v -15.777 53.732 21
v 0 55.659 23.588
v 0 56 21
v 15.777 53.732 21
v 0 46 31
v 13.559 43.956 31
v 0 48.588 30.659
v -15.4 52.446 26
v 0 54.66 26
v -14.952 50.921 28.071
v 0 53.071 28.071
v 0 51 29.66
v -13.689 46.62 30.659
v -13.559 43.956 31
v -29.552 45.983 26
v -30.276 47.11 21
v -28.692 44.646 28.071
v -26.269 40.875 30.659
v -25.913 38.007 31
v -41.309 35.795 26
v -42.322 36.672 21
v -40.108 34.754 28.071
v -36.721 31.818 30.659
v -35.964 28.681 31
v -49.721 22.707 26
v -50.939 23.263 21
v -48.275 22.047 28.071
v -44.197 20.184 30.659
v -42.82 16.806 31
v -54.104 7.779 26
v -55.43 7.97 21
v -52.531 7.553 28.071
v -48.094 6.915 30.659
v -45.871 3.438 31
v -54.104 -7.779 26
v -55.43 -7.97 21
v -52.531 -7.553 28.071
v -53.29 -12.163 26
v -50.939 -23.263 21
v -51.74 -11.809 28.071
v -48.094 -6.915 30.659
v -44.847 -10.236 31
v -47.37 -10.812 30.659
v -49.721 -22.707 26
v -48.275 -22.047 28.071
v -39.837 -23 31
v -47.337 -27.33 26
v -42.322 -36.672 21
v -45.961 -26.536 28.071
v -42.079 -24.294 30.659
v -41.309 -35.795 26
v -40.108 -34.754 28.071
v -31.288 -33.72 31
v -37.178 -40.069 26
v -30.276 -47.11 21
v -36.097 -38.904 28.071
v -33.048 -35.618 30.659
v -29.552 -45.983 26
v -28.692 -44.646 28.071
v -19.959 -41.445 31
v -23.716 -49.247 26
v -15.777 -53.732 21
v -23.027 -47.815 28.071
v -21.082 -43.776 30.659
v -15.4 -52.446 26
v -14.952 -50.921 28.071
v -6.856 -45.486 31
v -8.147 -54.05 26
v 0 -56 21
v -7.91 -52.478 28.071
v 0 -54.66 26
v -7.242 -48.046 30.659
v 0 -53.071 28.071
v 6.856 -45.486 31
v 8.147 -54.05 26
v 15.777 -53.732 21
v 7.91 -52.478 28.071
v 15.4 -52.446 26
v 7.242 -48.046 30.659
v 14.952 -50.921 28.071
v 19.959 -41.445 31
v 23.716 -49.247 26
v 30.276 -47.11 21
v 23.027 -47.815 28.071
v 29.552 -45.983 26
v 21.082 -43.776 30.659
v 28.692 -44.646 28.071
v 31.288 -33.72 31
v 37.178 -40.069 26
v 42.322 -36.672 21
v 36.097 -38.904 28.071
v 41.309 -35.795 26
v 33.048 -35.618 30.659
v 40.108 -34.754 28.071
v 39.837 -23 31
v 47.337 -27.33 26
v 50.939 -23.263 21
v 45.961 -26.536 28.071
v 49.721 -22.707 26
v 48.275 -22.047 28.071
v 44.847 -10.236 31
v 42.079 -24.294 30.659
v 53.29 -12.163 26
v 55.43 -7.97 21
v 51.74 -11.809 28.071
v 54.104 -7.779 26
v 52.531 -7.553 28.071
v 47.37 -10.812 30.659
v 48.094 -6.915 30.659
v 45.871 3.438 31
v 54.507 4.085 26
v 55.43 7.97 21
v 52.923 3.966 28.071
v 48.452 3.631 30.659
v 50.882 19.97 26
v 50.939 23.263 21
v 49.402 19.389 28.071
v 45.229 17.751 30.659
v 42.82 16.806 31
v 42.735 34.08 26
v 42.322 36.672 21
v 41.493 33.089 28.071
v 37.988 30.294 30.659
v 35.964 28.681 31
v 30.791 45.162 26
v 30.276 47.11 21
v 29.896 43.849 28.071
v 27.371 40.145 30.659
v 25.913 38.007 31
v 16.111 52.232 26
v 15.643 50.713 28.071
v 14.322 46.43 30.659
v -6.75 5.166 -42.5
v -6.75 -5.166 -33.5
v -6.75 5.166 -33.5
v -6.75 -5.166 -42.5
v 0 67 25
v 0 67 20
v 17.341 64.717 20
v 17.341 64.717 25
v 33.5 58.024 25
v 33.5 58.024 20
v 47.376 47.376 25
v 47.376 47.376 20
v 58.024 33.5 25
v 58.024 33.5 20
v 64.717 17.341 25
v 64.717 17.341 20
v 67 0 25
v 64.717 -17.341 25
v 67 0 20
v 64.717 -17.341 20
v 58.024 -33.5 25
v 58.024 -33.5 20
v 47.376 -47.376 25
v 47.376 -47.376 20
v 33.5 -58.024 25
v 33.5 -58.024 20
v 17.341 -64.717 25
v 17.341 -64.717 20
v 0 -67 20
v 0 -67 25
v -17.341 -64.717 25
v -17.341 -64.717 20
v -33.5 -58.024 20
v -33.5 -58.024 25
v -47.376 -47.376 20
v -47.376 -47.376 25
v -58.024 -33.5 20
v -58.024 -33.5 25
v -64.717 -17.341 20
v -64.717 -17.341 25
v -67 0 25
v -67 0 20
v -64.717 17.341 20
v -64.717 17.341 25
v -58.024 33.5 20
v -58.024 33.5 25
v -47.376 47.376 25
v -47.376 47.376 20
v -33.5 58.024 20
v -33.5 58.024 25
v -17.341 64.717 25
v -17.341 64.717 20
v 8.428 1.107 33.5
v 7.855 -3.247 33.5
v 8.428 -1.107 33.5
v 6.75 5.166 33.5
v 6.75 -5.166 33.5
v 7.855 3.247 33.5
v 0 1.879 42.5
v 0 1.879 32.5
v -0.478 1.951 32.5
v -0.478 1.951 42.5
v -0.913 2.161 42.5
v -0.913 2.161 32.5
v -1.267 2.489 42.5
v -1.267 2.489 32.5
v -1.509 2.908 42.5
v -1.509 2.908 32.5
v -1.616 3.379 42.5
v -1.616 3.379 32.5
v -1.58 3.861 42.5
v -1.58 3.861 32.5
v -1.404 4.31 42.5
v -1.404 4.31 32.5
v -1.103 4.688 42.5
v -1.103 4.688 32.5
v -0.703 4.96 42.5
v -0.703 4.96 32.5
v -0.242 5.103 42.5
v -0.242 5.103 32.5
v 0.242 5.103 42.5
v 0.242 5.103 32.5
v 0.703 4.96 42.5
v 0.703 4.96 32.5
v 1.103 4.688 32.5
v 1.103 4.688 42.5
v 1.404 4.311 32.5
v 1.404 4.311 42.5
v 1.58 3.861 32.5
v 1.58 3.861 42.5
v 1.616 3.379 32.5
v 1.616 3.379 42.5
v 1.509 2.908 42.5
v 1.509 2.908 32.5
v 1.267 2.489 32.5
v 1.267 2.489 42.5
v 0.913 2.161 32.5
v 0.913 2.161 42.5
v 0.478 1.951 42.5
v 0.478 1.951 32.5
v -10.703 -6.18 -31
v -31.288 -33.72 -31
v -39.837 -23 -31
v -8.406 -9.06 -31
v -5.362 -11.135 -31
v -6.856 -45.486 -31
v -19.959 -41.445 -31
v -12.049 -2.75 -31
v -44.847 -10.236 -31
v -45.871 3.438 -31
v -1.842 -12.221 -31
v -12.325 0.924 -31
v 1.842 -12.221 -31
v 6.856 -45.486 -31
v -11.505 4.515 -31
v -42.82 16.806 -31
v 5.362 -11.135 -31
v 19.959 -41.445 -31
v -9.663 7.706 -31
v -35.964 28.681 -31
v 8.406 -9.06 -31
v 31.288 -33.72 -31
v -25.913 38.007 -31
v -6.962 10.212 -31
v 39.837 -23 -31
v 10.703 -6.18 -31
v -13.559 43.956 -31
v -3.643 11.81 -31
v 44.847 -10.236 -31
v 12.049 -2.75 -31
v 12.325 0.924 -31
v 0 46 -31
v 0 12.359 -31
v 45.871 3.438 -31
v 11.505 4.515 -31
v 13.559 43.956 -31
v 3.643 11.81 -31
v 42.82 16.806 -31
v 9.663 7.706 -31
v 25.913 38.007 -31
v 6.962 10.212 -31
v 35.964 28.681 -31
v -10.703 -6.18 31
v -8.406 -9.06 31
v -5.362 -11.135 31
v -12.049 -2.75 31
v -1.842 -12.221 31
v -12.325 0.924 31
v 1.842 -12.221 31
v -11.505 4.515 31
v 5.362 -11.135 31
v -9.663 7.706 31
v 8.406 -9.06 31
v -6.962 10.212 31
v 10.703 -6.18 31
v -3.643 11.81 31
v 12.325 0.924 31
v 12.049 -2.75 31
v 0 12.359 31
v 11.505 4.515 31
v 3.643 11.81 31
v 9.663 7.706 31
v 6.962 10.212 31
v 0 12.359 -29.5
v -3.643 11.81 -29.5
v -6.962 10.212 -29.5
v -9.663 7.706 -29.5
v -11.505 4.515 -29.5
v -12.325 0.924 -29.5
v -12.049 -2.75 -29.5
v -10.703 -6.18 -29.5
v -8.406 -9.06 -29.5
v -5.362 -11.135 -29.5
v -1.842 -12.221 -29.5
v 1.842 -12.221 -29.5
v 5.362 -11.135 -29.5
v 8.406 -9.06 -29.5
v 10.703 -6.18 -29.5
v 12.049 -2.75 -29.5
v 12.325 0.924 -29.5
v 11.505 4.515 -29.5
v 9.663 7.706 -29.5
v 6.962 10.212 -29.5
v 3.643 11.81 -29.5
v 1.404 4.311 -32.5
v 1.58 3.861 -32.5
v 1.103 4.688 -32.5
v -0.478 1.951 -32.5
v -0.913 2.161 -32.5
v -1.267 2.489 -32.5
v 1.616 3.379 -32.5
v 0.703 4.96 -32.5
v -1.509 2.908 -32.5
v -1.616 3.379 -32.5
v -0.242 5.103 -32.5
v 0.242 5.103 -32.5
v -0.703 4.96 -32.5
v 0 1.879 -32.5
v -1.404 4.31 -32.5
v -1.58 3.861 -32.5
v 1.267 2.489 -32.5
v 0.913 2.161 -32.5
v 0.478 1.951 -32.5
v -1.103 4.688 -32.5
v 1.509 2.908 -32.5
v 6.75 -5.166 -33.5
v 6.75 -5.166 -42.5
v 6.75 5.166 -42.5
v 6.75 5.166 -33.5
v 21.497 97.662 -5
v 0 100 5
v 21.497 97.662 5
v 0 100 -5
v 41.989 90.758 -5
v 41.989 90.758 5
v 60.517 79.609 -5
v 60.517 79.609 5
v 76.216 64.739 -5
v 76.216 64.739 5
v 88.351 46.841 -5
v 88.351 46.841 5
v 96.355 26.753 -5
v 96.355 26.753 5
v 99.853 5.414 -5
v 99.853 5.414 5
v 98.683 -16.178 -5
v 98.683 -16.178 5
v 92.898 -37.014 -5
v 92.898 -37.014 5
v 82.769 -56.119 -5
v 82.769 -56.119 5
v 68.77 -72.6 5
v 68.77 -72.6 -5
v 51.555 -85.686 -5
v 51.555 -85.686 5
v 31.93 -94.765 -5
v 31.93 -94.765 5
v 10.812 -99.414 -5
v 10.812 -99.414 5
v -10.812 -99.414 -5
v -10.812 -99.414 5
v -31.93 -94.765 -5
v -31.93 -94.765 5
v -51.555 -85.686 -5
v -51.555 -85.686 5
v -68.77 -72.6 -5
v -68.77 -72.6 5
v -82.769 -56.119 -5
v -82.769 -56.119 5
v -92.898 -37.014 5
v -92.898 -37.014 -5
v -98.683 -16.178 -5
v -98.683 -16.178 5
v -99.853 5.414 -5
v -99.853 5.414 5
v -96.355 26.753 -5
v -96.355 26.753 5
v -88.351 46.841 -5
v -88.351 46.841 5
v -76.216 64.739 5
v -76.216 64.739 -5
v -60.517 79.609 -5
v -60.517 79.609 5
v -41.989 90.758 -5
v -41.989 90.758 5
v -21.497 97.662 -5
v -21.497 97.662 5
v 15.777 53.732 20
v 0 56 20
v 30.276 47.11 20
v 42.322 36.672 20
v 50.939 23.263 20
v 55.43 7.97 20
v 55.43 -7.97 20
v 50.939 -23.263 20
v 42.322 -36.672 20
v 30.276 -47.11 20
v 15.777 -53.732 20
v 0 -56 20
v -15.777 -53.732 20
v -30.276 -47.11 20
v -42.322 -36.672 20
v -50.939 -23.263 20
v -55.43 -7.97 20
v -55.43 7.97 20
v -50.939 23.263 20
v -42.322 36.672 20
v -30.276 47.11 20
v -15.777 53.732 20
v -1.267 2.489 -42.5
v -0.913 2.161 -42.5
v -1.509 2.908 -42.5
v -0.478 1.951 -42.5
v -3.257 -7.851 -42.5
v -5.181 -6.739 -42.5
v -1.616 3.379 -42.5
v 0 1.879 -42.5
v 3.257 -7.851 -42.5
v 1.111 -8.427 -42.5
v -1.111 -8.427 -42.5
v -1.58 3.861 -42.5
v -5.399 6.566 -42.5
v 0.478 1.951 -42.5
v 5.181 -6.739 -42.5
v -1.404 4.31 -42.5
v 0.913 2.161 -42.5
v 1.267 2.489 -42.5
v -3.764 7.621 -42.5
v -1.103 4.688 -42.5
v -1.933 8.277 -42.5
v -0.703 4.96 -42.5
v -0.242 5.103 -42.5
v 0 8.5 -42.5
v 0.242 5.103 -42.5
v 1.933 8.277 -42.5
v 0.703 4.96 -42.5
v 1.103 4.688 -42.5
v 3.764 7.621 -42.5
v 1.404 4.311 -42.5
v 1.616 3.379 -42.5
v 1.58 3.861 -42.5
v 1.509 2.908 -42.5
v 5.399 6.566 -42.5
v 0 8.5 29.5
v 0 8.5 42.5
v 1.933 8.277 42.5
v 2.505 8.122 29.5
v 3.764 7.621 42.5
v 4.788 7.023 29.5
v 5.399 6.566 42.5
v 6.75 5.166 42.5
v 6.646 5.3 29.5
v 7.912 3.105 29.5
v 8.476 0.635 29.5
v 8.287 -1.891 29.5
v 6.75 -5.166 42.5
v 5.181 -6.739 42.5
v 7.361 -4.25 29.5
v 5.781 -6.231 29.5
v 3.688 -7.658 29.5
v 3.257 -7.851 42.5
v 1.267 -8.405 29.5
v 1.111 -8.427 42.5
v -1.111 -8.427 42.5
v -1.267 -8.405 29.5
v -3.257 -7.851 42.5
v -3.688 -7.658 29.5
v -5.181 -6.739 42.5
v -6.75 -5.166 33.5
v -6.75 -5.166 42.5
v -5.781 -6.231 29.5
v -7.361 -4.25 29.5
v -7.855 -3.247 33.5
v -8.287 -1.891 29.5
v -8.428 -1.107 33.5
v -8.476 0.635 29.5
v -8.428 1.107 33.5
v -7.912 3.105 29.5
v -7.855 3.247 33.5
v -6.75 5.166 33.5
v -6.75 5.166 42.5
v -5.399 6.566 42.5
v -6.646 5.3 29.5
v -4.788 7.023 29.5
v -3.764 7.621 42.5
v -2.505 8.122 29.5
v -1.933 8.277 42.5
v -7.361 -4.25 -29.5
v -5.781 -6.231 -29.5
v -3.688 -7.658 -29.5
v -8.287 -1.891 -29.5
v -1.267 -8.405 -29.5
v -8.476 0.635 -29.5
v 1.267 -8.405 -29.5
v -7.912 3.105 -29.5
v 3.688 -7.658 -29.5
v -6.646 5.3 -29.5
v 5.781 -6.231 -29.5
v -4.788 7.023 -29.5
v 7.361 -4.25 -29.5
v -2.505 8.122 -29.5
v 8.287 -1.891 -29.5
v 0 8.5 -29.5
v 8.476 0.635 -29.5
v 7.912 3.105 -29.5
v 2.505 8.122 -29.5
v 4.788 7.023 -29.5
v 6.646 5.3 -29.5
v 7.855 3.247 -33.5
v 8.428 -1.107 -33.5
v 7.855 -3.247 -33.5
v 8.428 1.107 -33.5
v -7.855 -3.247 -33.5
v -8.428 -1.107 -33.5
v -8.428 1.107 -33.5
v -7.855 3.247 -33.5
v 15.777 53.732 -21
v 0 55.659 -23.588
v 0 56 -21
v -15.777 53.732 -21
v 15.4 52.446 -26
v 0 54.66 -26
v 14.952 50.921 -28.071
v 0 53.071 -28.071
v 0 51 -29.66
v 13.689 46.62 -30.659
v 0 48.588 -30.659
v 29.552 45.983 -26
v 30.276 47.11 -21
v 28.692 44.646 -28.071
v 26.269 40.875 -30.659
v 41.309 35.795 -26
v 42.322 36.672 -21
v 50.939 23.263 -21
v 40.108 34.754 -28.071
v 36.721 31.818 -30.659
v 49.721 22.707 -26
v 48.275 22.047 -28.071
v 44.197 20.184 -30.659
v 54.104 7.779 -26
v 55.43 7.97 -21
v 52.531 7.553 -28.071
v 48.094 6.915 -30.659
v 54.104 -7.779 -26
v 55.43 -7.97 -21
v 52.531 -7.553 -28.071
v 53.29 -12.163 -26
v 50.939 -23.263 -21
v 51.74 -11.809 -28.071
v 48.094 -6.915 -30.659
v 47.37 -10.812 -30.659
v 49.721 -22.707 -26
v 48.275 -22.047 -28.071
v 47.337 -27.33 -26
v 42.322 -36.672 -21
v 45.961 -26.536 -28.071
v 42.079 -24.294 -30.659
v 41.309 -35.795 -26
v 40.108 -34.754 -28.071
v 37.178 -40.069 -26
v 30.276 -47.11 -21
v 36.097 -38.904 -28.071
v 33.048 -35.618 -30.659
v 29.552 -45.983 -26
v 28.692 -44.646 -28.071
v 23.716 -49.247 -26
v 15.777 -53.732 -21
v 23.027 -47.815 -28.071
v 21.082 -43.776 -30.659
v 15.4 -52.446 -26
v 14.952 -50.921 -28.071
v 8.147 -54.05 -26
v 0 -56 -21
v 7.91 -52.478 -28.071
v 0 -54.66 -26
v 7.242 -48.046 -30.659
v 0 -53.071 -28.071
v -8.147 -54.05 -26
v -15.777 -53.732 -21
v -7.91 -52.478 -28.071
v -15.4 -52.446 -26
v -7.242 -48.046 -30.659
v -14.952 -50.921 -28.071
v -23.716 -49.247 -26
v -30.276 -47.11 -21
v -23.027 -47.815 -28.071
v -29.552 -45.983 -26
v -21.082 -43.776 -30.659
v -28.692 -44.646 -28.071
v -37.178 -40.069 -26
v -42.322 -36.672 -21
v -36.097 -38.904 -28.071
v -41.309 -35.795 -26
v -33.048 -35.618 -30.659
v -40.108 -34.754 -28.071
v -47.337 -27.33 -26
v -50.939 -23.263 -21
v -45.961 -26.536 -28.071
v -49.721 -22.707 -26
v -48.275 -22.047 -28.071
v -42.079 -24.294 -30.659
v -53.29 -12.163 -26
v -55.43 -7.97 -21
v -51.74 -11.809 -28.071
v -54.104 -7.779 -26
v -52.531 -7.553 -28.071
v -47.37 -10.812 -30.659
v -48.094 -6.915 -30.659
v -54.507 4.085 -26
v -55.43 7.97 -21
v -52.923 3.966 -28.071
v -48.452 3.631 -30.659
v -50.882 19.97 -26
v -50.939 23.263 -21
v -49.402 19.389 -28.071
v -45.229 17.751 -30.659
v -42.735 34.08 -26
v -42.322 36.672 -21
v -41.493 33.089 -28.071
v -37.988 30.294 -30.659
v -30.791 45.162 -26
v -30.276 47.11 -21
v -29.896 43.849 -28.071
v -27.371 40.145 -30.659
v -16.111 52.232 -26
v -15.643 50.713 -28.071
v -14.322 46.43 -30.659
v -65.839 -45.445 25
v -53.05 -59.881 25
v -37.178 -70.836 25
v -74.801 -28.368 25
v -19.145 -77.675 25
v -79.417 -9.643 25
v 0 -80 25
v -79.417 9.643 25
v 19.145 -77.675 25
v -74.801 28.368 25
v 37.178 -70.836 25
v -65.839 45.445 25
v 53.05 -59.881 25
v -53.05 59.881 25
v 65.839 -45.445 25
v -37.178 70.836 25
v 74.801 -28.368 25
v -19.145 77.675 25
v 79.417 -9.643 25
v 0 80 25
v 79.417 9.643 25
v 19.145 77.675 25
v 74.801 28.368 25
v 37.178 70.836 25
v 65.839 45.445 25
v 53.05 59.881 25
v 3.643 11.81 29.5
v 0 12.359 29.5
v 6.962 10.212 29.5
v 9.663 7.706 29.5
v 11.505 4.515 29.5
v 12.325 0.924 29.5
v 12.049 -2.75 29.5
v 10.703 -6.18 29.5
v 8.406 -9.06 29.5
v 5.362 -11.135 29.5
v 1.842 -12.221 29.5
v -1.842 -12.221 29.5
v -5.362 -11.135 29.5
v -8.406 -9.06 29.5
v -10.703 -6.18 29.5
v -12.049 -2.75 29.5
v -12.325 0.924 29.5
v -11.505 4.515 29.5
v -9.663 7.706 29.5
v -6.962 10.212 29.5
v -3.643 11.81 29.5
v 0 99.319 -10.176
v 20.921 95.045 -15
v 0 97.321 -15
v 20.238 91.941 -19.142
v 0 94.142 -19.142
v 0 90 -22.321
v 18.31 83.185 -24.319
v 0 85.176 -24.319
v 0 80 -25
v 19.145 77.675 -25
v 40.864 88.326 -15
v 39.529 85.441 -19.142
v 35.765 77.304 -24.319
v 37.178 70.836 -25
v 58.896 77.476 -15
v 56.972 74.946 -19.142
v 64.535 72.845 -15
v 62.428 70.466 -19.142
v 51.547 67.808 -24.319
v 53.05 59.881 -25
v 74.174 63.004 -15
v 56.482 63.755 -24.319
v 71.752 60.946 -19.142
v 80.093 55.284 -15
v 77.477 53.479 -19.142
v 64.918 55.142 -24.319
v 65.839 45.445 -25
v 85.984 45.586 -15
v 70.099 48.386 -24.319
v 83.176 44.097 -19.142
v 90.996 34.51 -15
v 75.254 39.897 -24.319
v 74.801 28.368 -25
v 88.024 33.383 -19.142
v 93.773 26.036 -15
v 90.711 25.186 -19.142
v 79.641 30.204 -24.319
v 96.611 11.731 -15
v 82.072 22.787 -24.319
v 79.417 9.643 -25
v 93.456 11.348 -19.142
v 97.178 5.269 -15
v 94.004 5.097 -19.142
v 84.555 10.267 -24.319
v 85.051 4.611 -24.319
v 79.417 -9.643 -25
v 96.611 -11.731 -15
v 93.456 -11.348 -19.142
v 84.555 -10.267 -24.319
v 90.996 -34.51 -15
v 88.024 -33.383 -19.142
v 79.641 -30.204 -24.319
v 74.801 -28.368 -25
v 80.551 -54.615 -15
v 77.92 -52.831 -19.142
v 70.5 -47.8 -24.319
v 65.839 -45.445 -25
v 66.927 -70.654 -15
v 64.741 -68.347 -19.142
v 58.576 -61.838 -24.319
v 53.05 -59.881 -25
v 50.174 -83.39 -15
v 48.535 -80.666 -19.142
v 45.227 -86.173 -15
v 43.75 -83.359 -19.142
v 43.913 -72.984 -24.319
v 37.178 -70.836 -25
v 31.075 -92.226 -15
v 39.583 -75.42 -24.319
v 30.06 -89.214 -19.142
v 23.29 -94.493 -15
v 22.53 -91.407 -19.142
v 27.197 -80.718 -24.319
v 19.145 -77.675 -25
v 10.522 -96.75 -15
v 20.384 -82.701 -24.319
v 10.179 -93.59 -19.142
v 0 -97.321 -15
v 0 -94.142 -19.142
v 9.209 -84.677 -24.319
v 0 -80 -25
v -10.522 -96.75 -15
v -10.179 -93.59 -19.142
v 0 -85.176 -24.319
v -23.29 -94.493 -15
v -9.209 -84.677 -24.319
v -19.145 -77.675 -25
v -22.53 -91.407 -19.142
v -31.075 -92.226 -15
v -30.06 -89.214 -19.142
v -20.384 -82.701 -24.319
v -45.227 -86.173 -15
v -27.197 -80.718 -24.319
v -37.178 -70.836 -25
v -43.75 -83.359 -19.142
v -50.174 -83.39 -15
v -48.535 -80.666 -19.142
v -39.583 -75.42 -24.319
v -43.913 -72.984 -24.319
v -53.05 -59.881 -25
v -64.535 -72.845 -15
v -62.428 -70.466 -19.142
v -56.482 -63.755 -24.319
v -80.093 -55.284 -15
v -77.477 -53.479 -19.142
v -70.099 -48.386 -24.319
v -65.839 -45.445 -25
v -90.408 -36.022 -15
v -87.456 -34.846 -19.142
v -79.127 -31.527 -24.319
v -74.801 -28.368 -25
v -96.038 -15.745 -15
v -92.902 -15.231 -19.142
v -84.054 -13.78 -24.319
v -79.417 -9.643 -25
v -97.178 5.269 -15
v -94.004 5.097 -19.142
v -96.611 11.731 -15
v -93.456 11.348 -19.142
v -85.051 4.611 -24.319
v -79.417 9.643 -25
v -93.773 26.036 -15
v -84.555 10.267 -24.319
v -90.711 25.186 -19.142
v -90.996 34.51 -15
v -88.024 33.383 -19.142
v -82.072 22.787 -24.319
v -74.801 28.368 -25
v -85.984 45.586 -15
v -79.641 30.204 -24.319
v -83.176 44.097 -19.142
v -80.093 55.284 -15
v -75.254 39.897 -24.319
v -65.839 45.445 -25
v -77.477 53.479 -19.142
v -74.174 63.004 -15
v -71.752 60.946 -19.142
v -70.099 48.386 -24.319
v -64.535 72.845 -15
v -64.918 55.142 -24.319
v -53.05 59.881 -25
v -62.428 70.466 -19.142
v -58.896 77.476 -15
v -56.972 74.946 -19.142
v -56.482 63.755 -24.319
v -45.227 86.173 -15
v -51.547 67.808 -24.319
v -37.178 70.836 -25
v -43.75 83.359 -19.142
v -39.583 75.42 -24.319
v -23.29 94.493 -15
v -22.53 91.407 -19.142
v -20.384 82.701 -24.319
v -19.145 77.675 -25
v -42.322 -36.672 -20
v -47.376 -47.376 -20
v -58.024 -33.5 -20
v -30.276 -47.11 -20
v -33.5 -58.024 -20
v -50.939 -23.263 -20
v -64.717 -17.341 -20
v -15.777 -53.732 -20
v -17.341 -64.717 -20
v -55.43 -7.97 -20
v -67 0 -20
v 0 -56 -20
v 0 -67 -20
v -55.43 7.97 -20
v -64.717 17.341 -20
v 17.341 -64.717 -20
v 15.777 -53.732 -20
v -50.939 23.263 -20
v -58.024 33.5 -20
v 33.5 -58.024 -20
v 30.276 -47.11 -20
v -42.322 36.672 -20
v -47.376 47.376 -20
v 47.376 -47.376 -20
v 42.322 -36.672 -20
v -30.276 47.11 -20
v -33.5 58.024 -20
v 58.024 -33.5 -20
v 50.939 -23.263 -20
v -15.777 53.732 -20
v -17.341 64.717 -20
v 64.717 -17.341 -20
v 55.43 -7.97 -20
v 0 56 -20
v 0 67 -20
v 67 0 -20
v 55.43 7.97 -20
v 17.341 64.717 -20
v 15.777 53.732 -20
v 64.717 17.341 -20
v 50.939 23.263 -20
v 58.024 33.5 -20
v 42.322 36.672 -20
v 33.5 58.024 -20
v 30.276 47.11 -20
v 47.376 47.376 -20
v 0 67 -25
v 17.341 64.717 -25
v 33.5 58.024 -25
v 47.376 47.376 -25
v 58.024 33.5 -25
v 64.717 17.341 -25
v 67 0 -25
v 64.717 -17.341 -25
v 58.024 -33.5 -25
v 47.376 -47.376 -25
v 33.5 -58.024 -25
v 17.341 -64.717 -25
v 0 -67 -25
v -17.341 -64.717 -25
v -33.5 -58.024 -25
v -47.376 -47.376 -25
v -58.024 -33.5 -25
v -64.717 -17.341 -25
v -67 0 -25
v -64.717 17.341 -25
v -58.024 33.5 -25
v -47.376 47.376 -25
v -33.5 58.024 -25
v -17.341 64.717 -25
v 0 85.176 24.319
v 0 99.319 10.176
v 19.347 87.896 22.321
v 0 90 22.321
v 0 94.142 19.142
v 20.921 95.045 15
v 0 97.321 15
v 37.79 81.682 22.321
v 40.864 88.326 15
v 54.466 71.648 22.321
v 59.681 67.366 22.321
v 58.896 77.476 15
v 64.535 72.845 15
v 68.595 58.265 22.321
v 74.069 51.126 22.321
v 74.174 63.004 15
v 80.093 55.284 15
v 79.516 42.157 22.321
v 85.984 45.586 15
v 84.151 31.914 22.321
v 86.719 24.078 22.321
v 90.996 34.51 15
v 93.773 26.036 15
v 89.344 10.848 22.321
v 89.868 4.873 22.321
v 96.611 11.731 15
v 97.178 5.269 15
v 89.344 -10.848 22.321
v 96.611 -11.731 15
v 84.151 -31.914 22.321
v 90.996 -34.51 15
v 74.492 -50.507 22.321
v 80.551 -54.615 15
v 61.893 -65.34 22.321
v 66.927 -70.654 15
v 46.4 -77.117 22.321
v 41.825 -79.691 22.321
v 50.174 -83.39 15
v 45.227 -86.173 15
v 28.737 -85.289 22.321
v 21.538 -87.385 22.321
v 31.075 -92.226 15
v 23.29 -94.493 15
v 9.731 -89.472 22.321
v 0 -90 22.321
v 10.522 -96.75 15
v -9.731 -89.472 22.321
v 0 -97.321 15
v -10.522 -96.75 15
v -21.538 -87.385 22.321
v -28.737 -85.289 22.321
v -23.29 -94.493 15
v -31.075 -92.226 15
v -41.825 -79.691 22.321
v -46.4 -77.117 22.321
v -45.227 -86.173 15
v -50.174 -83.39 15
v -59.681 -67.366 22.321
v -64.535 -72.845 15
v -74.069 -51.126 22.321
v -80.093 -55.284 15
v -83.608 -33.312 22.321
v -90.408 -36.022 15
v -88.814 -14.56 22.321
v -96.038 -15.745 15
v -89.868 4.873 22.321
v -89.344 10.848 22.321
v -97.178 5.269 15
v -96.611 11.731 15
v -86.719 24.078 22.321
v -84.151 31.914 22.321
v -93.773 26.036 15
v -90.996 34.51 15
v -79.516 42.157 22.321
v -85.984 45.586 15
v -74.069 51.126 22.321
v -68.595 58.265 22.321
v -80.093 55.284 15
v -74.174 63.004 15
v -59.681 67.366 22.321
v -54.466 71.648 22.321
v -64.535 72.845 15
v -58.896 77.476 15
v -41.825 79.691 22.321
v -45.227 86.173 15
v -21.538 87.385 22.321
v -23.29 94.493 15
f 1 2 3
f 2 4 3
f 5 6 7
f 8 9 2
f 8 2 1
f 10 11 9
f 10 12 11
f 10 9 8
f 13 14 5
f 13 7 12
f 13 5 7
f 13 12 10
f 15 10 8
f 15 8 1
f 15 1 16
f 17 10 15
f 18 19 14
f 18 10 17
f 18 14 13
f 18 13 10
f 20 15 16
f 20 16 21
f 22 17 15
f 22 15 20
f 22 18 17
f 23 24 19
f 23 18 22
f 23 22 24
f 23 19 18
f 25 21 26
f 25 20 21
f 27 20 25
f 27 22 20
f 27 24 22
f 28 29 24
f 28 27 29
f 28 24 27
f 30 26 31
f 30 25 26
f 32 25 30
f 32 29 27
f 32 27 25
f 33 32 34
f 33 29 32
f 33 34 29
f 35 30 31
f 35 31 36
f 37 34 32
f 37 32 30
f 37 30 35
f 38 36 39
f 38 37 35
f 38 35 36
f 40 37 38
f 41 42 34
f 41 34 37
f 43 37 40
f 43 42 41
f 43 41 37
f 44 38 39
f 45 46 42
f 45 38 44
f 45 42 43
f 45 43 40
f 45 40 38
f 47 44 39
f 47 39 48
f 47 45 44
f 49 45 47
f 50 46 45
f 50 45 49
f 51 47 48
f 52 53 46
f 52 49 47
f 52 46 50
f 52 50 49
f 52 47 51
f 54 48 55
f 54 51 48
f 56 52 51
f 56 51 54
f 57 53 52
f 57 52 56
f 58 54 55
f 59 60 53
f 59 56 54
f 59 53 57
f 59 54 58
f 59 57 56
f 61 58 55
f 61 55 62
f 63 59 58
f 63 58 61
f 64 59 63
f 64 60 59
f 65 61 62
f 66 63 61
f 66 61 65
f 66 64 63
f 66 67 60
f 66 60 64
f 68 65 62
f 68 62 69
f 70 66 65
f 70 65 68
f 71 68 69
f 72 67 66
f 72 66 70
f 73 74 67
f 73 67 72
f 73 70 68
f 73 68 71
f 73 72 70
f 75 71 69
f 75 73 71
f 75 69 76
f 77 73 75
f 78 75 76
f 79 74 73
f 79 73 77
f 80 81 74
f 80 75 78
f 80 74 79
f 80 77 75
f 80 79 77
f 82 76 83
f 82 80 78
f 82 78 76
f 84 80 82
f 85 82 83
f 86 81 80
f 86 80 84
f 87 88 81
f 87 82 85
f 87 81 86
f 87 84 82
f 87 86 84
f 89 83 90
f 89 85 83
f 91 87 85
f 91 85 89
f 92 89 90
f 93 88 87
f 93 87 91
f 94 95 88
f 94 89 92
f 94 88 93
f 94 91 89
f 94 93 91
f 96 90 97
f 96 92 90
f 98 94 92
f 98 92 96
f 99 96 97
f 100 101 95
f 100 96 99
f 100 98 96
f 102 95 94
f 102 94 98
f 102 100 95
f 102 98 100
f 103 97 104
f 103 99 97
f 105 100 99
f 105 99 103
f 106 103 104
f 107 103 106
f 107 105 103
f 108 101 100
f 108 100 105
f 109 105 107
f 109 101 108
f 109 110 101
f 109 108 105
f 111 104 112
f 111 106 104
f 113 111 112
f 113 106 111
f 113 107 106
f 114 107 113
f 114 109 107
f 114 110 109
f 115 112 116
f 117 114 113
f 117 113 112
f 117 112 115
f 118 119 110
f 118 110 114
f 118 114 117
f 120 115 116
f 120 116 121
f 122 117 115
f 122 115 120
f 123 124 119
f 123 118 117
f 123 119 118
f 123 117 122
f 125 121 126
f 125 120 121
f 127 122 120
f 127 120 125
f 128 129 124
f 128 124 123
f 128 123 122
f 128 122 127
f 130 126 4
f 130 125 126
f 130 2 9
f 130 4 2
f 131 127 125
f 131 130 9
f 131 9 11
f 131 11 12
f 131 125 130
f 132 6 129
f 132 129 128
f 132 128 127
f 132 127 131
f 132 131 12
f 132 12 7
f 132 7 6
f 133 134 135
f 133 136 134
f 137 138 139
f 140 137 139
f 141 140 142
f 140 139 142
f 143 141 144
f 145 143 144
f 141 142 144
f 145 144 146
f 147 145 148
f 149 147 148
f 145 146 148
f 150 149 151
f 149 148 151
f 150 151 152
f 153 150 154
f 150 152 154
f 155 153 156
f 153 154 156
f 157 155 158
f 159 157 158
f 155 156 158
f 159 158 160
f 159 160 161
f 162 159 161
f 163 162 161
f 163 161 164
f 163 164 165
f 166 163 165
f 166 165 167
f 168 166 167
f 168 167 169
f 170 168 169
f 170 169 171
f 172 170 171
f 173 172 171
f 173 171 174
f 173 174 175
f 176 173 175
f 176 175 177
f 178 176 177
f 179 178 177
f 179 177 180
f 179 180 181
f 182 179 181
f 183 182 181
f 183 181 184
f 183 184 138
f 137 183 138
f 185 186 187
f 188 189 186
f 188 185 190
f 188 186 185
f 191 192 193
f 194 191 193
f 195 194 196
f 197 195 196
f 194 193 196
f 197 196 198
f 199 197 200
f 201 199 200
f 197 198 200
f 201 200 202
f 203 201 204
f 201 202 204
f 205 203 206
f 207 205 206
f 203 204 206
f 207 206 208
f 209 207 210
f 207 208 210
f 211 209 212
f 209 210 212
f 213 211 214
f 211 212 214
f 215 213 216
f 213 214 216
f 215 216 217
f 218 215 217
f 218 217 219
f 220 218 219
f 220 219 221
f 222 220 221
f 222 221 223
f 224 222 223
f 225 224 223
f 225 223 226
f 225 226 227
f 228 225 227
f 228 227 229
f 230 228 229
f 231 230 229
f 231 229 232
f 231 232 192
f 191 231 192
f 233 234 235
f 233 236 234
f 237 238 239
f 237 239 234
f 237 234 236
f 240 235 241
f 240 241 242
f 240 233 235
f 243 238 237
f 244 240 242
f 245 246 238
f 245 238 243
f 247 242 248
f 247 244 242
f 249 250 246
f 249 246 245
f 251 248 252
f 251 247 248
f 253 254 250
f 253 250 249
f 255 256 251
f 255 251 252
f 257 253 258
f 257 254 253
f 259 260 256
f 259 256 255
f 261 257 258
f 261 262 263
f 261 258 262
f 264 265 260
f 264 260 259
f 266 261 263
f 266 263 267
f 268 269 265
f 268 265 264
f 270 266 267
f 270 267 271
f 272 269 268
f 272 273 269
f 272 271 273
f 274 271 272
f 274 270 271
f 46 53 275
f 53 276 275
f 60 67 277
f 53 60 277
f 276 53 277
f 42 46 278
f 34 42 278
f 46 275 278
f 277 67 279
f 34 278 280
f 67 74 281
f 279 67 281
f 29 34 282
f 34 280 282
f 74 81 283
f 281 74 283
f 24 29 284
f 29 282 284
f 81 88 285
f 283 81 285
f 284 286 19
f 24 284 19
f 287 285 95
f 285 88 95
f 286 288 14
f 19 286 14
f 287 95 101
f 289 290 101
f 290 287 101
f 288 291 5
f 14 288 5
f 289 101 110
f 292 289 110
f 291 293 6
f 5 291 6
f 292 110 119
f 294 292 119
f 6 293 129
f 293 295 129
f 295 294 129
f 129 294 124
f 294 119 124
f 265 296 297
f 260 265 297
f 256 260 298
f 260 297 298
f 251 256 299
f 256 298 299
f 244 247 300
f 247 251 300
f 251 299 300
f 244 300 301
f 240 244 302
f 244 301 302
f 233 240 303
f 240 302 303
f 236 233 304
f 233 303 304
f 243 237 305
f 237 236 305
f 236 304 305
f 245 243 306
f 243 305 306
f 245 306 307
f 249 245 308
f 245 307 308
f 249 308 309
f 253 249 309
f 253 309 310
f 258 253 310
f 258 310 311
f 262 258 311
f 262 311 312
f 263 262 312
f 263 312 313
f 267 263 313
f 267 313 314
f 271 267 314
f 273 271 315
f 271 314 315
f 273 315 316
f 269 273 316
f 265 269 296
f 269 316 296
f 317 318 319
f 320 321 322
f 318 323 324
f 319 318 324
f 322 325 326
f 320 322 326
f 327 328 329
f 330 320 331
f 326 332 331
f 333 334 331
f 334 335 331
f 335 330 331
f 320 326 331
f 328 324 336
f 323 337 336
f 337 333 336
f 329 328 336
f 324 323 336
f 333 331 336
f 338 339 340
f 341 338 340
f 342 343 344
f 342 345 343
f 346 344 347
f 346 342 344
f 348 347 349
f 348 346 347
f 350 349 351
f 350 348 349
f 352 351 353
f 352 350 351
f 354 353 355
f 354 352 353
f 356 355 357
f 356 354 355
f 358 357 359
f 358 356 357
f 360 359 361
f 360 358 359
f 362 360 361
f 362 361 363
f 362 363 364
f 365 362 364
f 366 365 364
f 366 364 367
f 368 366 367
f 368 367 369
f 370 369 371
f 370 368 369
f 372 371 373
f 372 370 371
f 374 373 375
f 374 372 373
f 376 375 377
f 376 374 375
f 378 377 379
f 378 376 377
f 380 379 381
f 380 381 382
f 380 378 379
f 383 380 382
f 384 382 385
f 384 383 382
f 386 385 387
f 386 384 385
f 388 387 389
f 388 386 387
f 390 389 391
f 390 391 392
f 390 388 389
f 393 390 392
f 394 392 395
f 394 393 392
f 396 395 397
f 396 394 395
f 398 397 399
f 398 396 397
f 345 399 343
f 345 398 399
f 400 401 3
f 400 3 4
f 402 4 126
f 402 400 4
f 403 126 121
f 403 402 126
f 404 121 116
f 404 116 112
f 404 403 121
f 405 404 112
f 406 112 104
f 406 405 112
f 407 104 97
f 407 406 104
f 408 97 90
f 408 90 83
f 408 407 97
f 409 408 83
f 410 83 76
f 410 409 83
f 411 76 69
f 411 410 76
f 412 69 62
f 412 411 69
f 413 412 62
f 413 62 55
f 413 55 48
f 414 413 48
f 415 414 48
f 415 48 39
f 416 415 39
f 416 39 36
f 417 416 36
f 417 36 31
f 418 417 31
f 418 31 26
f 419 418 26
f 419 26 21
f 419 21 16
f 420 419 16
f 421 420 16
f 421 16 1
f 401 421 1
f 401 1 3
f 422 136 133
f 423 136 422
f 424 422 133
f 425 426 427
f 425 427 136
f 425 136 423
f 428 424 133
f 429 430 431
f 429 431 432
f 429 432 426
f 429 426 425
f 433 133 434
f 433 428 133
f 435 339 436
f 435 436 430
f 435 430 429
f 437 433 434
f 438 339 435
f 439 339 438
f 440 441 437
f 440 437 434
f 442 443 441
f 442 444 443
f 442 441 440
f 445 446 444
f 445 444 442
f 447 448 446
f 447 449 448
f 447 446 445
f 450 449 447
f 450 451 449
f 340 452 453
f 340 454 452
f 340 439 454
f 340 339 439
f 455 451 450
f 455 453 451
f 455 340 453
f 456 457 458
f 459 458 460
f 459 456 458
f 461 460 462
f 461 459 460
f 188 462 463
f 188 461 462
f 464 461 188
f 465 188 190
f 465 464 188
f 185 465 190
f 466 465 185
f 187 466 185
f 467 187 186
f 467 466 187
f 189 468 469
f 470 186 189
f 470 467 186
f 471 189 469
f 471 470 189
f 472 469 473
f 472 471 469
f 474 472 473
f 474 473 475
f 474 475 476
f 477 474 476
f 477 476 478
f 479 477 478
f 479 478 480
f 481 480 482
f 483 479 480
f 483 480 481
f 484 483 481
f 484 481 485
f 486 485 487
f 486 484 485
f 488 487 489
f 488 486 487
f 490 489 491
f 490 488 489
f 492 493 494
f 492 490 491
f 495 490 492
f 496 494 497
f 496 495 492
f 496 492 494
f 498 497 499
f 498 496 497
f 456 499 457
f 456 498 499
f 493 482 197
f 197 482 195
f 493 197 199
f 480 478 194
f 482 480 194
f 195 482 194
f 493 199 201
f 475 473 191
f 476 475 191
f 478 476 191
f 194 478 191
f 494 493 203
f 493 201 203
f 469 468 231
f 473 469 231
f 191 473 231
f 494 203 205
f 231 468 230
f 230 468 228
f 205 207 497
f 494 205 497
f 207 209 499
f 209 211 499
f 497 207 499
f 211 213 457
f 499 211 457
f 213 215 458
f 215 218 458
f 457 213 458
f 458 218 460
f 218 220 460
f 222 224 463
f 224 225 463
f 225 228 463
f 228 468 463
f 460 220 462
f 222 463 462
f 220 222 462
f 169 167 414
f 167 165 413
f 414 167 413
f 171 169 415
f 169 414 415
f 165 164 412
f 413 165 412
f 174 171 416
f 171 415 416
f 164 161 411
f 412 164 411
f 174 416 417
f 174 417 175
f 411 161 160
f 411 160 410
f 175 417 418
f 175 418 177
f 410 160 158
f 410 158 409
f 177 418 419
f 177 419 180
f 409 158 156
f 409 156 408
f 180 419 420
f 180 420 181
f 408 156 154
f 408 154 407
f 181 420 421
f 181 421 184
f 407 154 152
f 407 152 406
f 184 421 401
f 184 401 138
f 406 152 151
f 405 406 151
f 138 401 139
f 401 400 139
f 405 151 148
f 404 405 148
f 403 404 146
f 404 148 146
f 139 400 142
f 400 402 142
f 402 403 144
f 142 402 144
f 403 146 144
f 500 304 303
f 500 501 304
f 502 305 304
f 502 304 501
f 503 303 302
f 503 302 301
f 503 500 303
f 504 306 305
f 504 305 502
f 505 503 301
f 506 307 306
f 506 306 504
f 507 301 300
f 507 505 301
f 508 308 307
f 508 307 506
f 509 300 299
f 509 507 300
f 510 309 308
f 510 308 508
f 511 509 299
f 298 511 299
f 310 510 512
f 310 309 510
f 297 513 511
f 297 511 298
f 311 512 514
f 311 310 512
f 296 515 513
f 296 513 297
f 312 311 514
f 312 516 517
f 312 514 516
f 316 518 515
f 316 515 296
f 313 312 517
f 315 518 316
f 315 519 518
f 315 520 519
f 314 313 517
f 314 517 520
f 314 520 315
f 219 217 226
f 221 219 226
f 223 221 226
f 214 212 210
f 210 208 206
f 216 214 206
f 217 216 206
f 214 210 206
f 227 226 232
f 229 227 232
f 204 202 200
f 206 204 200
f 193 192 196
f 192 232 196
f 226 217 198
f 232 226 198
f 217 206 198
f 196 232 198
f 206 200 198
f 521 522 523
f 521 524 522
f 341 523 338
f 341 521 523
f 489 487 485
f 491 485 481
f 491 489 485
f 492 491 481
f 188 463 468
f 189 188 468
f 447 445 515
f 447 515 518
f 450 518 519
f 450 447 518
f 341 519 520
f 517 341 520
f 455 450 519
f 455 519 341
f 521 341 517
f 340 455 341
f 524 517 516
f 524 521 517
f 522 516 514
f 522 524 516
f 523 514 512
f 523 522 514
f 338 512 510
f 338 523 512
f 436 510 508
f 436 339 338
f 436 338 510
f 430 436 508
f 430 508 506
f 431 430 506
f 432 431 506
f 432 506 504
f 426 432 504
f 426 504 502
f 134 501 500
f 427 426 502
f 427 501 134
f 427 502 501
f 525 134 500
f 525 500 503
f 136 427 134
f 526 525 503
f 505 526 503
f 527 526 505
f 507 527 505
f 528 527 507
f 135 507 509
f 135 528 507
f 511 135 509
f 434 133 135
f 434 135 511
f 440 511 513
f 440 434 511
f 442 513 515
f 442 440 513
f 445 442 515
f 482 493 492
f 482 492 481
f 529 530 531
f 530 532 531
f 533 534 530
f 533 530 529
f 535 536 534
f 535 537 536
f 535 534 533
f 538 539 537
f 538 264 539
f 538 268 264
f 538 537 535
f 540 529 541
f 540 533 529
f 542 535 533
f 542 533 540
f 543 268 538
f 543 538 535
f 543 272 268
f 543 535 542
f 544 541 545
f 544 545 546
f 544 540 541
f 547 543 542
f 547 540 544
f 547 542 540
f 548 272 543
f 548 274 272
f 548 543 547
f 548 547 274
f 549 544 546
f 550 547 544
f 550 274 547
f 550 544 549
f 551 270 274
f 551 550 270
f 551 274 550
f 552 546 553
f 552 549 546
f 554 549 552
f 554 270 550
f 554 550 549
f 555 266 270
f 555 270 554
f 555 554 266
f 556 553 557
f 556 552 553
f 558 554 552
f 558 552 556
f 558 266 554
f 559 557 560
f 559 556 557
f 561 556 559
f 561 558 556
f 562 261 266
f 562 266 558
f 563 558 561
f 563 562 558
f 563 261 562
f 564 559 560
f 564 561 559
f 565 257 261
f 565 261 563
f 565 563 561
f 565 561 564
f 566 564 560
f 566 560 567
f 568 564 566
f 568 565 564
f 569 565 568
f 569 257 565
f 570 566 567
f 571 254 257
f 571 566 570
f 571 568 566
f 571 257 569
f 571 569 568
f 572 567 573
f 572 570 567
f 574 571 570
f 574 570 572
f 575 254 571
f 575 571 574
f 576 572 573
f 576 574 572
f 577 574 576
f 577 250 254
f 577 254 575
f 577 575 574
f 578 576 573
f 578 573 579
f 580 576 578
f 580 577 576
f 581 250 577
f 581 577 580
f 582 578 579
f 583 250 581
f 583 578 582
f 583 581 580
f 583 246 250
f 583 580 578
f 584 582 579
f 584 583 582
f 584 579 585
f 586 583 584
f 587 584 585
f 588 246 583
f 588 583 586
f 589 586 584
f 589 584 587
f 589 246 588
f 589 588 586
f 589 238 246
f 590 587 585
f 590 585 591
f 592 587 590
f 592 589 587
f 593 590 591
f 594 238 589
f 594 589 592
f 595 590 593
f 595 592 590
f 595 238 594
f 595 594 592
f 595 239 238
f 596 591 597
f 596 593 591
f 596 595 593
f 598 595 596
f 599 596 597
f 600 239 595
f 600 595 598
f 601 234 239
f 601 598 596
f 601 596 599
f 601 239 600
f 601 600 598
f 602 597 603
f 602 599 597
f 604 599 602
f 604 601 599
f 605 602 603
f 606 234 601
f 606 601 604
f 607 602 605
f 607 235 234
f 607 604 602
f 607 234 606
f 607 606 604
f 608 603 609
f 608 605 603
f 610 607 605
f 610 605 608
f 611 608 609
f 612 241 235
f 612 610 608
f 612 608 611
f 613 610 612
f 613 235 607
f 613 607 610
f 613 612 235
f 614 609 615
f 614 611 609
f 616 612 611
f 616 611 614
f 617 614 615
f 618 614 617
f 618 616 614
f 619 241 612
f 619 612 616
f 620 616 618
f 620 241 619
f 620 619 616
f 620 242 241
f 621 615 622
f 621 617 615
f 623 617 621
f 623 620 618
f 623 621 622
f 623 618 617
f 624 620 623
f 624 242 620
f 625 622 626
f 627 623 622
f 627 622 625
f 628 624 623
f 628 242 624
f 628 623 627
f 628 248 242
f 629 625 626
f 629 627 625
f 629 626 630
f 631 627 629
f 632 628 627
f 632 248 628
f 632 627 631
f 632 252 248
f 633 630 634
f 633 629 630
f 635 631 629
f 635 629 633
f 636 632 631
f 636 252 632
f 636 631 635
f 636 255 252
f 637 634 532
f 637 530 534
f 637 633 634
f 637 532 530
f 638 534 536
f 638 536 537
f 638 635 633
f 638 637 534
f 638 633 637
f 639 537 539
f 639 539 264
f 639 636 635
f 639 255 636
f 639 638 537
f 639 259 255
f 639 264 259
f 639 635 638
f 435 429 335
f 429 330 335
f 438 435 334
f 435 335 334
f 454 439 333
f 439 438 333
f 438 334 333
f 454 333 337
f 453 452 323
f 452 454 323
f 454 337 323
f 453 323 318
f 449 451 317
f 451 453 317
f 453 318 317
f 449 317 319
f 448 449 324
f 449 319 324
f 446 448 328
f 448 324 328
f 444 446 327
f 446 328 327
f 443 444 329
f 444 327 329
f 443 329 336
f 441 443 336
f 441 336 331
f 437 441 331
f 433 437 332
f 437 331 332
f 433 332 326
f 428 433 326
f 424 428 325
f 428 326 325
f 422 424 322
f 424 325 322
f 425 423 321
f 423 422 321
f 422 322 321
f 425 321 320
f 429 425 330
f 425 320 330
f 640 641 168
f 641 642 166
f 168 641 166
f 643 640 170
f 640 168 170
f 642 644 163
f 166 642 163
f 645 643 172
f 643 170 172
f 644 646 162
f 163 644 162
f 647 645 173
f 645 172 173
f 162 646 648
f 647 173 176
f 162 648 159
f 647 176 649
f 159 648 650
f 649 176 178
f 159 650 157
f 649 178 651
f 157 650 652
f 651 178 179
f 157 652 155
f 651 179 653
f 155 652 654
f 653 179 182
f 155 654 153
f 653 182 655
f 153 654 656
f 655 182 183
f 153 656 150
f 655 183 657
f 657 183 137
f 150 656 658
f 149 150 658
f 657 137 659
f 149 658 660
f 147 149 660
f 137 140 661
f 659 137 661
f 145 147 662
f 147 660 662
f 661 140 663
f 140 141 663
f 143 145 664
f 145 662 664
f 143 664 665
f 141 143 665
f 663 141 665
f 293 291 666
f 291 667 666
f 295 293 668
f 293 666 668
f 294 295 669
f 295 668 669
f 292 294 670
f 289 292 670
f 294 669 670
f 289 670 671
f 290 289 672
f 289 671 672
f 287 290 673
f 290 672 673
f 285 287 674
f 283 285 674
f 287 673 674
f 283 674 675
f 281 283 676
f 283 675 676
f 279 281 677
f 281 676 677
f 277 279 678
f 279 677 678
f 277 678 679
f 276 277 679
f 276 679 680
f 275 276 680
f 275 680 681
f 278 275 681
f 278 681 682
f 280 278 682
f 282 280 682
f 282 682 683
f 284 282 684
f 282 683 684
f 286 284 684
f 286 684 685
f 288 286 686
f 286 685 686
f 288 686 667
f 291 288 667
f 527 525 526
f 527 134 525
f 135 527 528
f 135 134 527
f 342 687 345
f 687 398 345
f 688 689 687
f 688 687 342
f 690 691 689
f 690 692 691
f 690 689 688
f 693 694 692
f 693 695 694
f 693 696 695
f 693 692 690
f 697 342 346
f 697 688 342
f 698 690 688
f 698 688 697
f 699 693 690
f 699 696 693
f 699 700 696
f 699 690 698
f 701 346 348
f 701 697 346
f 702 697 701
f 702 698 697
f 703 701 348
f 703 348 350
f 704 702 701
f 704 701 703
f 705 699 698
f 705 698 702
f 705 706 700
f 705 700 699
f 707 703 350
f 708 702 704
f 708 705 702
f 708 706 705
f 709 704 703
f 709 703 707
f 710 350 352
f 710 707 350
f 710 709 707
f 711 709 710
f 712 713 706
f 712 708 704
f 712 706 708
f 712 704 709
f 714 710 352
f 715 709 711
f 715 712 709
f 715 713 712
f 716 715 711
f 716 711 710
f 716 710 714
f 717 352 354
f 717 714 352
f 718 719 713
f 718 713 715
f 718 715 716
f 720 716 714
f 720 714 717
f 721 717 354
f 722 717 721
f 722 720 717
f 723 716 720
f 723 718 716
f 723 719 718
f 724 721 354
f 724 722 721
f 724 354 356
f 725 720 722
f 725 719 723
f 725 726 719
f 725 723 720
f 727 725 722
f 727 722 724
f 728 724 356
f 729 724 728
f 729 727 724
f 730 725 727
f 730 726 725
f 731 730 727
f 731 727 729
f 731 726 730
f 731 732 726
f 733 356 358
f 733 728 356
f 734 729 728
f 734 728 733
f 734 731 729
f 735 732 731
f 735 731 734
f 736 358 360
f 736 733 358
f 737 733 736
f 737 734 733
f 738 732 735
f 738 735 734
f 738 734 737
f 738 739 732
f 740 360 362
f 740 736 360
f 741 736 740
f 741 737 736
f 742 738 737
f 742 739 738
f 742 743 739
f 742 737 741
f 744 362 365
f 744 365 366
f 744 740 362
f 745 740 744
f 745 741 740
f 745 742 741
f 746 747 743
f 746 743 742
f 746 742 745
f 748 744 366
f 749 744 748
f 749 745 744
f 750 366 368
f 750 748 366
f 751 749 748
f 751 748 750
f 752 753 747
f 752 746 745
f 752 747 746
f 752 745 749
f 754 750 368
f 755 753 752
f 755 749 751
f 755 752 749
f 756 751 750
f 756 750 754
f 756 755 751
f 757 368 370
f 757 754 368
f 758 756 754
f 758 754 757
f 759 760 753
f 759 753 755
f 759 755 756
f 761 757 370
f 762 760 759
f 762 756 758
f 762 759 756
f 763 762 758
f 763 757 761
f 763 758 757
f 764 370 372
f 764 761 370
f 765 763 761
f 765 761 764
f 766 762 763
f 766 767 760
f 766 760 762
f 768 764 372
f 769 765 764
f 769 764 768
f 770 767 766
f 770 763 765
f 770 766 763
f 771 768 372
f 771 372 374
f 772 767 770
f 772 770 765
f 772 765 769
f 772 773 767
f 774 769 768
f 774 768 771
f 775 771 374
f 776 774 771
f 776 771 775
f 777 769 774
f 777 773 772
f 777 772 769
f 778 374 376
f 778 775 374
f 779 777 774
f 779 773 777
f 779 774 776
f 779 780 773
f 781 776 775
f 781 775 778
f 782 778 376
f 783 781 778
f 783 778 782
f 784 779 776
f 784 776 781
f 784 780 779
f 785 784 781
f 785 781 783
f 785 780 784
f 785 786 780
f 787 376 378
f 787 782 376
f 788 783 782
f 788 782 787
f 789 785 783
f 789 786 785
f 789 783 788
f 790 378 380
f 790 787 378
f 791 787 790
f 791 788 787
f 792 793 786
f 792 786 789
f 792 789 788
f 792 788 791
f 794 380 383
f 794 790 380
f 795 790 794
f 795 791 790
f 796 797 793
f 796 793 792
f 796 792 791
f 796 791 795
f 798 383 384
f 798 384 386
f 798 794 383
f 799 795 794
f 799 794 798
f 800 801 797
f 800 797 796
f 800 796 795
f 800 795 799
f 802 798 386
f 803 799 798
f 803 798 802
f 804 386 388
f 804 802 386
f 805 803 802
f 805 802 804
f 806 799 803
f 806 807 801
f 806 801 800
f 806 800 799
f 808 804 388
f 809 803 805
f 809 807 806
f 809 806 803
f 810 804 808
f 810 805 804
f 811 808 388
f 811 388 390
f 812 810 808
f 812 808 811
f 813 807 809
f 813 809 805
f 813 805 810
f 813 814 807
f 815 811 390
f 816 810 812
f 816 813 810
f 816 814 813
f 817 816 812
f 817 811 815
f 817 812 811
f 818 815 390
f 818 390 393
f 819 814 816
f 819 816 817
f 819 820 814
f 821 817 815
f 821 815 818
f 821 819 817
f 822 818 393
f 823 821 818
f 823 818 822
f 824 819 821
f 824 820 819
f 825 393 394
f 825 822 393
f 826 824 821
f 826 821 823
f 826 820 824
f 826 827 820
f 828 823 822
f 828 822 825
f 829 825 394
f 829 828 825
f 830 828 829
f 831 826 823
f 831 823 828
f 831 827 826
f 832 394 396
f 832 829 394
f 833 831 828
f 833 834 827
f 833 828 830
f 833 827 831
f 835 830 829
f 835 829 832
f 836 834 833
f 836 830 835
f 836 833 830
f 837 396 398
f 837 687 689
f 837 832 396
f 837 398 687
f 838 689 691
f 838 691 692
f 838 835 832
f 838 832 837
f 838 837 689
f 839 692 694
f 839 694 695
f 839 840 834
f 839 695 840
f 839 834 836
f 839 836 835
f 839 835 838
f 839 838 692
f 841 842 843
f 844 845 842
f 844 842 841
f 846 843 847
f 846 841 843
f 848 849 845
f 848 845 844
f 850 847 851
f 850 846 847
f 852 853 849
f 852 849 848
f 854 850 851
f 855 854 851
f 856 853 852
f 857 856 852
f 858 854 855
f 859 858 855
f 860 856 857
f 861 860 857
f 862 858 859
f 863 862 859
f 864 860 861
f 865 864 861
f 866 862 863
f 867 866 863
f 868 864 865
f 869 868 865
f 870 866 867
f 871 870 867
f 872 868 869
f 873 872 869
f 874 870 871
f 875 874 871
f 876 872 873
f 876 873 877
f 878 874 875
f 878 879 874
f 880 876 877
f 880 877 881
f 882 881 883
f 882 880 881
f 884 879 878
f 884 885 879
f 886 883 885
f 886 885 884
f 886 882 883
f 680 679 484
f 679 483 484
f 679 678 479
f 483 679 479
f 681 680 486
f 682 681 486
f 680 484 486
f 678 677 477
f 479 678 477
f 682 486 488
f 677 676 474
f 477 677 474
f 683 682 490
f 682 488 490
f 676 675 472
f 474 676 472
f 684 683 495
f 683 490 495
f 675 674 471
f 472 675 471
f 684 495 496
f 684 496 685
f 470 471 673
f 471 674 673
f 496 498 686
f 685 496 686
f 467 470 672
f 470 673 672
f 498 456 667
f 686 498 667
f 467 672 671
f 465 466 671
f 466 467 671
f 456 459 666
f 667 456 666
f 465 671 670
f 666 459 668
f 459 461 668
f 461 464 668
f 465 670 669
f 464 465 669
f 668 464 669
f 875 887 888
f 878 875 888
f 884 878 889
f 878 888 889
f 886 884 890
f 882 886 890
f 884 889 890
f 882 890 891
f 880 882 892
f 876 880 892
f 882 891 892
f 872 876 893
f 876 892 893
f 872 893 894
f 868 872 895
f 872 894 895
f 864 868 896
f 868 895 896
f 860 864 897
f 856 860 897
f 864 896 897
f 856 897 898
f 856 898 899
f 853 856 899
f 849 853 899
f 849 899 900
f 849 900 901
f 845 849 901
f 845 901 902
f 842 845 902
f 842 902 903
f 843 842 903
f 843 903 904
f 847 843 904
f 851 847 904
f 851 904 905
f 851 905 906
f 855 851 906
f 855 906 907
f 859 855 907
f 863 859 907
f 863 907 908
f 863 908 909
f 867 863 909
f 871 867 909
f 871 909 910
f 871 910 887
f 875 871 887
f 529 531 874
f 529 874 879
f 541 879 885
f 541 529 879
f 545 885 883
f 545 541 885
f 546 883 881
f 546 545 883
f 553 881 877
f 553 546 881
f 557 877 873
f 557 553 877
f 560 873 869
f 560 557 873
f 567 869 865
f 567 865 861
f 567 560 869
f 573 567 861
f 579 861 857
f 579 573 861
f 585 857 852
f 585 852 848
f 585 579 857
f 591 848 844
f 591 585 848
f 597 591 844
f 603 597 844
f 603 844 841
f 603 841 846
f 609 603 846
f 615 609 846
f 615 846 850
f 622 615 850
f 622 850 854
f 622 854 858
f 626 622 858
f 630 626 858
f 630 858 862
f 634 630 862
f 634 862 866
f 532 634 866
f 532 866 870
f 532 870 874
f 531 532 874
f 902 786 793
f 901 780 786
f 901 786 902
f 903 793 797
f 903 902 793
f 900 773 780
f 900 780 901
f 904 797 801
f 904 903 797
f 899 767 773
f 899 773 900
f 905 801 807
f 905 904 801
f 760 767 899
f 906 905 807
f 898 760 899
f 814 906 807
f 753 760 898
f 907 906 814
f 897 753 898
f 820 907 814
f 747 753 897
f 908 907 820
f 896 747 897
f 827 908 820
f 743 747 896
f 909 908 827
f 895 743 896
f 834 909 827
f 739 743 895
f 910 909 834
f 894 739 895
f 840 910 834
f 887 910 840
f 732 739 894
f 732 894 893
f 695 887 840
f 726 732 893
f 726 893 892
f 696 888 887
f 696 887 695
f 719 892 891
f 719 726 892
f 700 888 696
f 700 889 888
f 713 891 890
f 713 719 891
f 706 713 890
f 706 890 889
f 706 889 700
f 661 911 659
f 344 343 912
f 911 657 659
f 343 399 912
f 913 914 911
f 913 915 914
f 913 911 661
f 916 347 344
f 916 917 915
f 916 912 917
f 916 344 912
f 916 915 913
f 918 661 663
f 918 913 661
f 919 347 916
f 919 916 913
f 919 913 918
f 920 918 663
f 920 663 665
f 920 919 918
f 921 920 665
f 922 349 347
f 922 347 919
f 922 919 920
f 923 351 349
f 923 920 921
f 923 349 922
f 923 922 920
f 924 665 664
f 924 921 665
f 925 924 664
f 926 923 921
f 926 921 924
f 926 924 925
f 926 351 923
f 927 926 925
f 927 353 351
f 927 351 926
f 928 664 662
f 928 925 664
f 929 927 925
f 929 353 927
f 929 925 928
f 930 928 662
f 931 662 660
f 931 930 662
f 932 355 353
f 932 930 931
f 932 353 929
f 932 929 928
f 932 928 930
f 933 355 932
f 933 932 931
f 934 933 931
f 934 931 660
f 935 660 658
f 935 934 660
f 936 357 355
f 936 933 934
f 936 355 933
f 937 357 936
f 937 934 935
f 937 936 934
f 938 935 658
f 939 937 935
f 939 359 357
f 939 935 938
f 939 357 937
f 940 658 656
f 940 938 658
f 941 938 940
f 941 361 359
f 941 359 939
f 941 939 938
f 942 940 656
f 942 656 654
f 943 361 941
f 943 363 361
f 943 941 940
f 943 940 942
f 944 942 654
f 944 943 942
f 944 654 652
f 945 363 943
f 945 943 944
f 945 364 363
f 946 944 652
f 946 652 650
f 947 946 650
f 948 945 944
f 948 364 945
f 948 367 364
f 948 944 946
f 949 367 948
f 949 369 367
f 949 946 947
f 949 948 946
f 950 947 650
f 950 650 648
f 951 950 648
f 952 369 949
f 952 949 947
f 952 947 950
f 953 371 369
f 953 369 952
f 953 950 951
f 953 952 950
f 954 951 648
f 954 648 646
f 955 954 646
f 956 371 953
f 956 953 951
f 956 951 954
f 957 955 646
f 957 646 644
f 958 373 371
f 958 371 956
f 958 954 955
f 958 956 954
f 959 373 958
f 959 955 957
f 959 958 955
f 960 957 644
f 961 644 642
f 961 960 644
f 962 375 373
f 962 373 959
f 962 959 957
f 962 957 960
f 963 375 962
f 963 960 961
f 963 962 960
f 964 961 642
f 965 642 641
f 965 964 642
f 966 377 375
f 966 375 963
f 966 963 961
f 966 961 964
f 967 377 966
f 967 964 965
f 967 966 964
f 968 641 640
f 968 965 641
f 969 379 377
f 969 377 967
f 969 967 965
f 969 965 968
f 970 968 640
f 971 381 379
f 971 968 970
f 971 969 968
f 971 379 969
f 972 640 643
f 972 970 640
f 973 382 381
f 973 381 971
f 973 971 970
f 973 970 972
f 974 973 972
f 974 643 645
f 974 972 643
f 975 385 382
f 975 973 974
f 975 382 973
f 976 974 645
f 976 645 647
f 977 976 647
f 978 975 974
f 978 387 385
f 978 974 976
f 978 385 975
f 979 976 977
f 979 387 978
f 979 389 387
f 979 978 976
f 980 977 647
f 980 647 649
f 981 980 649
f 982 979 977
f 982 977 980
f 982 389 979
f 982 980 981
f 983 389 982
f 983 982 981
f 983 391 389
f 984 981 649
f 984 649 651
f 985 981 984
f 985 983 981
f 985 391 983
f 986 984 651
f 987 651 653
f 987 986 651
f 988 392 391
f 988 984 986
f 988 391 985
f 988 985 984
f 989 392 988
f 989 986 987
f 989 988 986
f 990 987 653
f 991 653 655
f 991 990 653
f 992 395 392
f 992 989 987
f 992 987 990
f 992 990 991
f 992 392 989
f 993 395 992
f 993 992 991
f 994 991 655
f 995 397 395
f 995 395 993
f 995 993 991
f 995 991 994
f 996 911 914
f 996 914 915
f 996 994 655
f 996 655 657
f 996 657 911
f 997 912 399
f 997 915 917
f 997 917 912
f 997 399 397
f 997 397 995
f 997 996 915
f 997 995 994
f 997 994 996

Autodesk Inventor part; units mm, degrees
ref_plane "YZ Plane" through (0, 0, 0) normal (1, 0, 0) x (0, 1, 0)
ref_plane "XZ Plane" through (0, 0, 0) normal (0, 1, 0) x (-1, 0, 0)
ref_plane "XY Plane" through (0, 0, 0) normal (0, 0, 1) x (1, 0, 0)
sketch "Sketch1" plane through (0, 0, 0) normal (0, 0, 1) x (1, 0, 0)
  circle A0 centre (0, 0) radius 100
  circle A1 centre (0, 0) radius 56
  circle A2 centre (0, 0) radius 67
  circle A3 centre (0, 0) radius 7.5
  dimension "d0" = 200
  dimension "d1" = 112
  dimension "d2" = 11
  dimension "d3" = 15
extrude "Extrusion1" [suppressed]
extrude "Extrusion2" [suppressed]
extrude "Extrusion3" [suppressed]
extrude "Extrusion4" [suppressed]
sketch "Sketch2" plane through (0, 0, 0) normal (1, 0, 0) x (0, 1, 0)
  line L0 (0, 42.5) -> (0, -42.5)
  line L1 (0, 42.5) -> (8.5, 42.5)
  line L2 (8.5, 42.5) -> (8.5, -42.5)
  line L3 (8.5, -42.5) -> (0, -42.5)
  line L4 (56, 31) -> (56, -31)
  line L5 (0, 0) -> (100, 0) construction
  line L6 (56, 31) -> (12.3593, 31)
  line L7 (56, -31) -> (12.3593, -31)
  line L8 (67, 20) -> (67, -20)
  line L9 (100, 25) -> (100, -25)
  line L10 (56, 20) -> (67, 20)
  line L11 (67, -20) -> (56, -20)
  line L12 (100, 25) -> (67, 25)
  line L13 (67, 25) -> (67, 20)
  line L14 (67, -20) -> (67, -25)
  line L15 (67, -25) -> (100, -25)
  line L16 (12.3593, 31) -> (12.3593, 29.5)
  line L17 (12.3593, 29.5) -> (8.5, 29.5)
  line L18 (12.3593, -31) -> (12.3593, -29.5)
  line L19 (12.3593, -29.5) -> (8.5, -29.5)
  point P0 (56, 0)
  point P1 (8.5, 32.5)
  point P2 (8.5, -32.5)
  point P3 (67, 0)
  point P4 (4.25, 42.5)
  dimension "d12" = 85
  dimension "d13" = 8.5
  dimension "d15" = 100
  dimension "d16" = 56
  dimension "d17" = 40
  dimension "d18" = 11
  dimension "d19" = 50
  dimension "d27" = 13
  dimension "d28" = 1.5
revolve "Revolution1" add sketch "Sketch2" angle 360 about axis through (0, 0, 42.5) along (0, 0, -1)
fillet "Fillet1" radius 20 2 edges at (0, -100, 25) (0, -100, -25)
fillet "Fillet2" radius 10 2 edges at (0, -56, 31) (0, -56, -31)
sketch "Sketch3" plane through (0, 0, 42.5) normal (0, 0, 1) x (1, 0, 0)
  circle A0 centre (0, 0) radius 8.5
  line L0 (-6.75, 5.166) -> (-6.75, -5.166)
  line L1 (6.75, 5.166) -> (6.75, -5.166)
  circle A1 centre (0, 0) radius 8.5 projected
  circle A2 centre (0, 0) radius 8.5 projected
  line L2 (-6.75, 0) -> (6.75, 0) construction
  circle A3 centre (0, 3.5) radius 2
  circle A4 centre (0, 0) radius 8.5 projected
  point P0 (6.6019, 3.3672)
  point P1 (6.6019, -3.3672)
  point P2 (0, 5.5)
  point P3 (0, 8.5)
  dimension "d29" = 4
  dimension "d24" = 13.5
  dimension "d30" = 3
extrude "Extrusion5" cut sketch "Sketch3" against normal blind 9 contours A0 L1 | L0 A0
hole "Hole1" at (0, 3.5, 42.5) direction (0, 0, -1) diameter 3.242 depth 10 thread size "M4x0.7" class "6H" standard "ISO Metric profile"
mirror "Mirror1" about plane through (0, 0, 0) normal (0, 0, 1) of "Extrusion5", "Hole1"
properties part number "motor at24v"
